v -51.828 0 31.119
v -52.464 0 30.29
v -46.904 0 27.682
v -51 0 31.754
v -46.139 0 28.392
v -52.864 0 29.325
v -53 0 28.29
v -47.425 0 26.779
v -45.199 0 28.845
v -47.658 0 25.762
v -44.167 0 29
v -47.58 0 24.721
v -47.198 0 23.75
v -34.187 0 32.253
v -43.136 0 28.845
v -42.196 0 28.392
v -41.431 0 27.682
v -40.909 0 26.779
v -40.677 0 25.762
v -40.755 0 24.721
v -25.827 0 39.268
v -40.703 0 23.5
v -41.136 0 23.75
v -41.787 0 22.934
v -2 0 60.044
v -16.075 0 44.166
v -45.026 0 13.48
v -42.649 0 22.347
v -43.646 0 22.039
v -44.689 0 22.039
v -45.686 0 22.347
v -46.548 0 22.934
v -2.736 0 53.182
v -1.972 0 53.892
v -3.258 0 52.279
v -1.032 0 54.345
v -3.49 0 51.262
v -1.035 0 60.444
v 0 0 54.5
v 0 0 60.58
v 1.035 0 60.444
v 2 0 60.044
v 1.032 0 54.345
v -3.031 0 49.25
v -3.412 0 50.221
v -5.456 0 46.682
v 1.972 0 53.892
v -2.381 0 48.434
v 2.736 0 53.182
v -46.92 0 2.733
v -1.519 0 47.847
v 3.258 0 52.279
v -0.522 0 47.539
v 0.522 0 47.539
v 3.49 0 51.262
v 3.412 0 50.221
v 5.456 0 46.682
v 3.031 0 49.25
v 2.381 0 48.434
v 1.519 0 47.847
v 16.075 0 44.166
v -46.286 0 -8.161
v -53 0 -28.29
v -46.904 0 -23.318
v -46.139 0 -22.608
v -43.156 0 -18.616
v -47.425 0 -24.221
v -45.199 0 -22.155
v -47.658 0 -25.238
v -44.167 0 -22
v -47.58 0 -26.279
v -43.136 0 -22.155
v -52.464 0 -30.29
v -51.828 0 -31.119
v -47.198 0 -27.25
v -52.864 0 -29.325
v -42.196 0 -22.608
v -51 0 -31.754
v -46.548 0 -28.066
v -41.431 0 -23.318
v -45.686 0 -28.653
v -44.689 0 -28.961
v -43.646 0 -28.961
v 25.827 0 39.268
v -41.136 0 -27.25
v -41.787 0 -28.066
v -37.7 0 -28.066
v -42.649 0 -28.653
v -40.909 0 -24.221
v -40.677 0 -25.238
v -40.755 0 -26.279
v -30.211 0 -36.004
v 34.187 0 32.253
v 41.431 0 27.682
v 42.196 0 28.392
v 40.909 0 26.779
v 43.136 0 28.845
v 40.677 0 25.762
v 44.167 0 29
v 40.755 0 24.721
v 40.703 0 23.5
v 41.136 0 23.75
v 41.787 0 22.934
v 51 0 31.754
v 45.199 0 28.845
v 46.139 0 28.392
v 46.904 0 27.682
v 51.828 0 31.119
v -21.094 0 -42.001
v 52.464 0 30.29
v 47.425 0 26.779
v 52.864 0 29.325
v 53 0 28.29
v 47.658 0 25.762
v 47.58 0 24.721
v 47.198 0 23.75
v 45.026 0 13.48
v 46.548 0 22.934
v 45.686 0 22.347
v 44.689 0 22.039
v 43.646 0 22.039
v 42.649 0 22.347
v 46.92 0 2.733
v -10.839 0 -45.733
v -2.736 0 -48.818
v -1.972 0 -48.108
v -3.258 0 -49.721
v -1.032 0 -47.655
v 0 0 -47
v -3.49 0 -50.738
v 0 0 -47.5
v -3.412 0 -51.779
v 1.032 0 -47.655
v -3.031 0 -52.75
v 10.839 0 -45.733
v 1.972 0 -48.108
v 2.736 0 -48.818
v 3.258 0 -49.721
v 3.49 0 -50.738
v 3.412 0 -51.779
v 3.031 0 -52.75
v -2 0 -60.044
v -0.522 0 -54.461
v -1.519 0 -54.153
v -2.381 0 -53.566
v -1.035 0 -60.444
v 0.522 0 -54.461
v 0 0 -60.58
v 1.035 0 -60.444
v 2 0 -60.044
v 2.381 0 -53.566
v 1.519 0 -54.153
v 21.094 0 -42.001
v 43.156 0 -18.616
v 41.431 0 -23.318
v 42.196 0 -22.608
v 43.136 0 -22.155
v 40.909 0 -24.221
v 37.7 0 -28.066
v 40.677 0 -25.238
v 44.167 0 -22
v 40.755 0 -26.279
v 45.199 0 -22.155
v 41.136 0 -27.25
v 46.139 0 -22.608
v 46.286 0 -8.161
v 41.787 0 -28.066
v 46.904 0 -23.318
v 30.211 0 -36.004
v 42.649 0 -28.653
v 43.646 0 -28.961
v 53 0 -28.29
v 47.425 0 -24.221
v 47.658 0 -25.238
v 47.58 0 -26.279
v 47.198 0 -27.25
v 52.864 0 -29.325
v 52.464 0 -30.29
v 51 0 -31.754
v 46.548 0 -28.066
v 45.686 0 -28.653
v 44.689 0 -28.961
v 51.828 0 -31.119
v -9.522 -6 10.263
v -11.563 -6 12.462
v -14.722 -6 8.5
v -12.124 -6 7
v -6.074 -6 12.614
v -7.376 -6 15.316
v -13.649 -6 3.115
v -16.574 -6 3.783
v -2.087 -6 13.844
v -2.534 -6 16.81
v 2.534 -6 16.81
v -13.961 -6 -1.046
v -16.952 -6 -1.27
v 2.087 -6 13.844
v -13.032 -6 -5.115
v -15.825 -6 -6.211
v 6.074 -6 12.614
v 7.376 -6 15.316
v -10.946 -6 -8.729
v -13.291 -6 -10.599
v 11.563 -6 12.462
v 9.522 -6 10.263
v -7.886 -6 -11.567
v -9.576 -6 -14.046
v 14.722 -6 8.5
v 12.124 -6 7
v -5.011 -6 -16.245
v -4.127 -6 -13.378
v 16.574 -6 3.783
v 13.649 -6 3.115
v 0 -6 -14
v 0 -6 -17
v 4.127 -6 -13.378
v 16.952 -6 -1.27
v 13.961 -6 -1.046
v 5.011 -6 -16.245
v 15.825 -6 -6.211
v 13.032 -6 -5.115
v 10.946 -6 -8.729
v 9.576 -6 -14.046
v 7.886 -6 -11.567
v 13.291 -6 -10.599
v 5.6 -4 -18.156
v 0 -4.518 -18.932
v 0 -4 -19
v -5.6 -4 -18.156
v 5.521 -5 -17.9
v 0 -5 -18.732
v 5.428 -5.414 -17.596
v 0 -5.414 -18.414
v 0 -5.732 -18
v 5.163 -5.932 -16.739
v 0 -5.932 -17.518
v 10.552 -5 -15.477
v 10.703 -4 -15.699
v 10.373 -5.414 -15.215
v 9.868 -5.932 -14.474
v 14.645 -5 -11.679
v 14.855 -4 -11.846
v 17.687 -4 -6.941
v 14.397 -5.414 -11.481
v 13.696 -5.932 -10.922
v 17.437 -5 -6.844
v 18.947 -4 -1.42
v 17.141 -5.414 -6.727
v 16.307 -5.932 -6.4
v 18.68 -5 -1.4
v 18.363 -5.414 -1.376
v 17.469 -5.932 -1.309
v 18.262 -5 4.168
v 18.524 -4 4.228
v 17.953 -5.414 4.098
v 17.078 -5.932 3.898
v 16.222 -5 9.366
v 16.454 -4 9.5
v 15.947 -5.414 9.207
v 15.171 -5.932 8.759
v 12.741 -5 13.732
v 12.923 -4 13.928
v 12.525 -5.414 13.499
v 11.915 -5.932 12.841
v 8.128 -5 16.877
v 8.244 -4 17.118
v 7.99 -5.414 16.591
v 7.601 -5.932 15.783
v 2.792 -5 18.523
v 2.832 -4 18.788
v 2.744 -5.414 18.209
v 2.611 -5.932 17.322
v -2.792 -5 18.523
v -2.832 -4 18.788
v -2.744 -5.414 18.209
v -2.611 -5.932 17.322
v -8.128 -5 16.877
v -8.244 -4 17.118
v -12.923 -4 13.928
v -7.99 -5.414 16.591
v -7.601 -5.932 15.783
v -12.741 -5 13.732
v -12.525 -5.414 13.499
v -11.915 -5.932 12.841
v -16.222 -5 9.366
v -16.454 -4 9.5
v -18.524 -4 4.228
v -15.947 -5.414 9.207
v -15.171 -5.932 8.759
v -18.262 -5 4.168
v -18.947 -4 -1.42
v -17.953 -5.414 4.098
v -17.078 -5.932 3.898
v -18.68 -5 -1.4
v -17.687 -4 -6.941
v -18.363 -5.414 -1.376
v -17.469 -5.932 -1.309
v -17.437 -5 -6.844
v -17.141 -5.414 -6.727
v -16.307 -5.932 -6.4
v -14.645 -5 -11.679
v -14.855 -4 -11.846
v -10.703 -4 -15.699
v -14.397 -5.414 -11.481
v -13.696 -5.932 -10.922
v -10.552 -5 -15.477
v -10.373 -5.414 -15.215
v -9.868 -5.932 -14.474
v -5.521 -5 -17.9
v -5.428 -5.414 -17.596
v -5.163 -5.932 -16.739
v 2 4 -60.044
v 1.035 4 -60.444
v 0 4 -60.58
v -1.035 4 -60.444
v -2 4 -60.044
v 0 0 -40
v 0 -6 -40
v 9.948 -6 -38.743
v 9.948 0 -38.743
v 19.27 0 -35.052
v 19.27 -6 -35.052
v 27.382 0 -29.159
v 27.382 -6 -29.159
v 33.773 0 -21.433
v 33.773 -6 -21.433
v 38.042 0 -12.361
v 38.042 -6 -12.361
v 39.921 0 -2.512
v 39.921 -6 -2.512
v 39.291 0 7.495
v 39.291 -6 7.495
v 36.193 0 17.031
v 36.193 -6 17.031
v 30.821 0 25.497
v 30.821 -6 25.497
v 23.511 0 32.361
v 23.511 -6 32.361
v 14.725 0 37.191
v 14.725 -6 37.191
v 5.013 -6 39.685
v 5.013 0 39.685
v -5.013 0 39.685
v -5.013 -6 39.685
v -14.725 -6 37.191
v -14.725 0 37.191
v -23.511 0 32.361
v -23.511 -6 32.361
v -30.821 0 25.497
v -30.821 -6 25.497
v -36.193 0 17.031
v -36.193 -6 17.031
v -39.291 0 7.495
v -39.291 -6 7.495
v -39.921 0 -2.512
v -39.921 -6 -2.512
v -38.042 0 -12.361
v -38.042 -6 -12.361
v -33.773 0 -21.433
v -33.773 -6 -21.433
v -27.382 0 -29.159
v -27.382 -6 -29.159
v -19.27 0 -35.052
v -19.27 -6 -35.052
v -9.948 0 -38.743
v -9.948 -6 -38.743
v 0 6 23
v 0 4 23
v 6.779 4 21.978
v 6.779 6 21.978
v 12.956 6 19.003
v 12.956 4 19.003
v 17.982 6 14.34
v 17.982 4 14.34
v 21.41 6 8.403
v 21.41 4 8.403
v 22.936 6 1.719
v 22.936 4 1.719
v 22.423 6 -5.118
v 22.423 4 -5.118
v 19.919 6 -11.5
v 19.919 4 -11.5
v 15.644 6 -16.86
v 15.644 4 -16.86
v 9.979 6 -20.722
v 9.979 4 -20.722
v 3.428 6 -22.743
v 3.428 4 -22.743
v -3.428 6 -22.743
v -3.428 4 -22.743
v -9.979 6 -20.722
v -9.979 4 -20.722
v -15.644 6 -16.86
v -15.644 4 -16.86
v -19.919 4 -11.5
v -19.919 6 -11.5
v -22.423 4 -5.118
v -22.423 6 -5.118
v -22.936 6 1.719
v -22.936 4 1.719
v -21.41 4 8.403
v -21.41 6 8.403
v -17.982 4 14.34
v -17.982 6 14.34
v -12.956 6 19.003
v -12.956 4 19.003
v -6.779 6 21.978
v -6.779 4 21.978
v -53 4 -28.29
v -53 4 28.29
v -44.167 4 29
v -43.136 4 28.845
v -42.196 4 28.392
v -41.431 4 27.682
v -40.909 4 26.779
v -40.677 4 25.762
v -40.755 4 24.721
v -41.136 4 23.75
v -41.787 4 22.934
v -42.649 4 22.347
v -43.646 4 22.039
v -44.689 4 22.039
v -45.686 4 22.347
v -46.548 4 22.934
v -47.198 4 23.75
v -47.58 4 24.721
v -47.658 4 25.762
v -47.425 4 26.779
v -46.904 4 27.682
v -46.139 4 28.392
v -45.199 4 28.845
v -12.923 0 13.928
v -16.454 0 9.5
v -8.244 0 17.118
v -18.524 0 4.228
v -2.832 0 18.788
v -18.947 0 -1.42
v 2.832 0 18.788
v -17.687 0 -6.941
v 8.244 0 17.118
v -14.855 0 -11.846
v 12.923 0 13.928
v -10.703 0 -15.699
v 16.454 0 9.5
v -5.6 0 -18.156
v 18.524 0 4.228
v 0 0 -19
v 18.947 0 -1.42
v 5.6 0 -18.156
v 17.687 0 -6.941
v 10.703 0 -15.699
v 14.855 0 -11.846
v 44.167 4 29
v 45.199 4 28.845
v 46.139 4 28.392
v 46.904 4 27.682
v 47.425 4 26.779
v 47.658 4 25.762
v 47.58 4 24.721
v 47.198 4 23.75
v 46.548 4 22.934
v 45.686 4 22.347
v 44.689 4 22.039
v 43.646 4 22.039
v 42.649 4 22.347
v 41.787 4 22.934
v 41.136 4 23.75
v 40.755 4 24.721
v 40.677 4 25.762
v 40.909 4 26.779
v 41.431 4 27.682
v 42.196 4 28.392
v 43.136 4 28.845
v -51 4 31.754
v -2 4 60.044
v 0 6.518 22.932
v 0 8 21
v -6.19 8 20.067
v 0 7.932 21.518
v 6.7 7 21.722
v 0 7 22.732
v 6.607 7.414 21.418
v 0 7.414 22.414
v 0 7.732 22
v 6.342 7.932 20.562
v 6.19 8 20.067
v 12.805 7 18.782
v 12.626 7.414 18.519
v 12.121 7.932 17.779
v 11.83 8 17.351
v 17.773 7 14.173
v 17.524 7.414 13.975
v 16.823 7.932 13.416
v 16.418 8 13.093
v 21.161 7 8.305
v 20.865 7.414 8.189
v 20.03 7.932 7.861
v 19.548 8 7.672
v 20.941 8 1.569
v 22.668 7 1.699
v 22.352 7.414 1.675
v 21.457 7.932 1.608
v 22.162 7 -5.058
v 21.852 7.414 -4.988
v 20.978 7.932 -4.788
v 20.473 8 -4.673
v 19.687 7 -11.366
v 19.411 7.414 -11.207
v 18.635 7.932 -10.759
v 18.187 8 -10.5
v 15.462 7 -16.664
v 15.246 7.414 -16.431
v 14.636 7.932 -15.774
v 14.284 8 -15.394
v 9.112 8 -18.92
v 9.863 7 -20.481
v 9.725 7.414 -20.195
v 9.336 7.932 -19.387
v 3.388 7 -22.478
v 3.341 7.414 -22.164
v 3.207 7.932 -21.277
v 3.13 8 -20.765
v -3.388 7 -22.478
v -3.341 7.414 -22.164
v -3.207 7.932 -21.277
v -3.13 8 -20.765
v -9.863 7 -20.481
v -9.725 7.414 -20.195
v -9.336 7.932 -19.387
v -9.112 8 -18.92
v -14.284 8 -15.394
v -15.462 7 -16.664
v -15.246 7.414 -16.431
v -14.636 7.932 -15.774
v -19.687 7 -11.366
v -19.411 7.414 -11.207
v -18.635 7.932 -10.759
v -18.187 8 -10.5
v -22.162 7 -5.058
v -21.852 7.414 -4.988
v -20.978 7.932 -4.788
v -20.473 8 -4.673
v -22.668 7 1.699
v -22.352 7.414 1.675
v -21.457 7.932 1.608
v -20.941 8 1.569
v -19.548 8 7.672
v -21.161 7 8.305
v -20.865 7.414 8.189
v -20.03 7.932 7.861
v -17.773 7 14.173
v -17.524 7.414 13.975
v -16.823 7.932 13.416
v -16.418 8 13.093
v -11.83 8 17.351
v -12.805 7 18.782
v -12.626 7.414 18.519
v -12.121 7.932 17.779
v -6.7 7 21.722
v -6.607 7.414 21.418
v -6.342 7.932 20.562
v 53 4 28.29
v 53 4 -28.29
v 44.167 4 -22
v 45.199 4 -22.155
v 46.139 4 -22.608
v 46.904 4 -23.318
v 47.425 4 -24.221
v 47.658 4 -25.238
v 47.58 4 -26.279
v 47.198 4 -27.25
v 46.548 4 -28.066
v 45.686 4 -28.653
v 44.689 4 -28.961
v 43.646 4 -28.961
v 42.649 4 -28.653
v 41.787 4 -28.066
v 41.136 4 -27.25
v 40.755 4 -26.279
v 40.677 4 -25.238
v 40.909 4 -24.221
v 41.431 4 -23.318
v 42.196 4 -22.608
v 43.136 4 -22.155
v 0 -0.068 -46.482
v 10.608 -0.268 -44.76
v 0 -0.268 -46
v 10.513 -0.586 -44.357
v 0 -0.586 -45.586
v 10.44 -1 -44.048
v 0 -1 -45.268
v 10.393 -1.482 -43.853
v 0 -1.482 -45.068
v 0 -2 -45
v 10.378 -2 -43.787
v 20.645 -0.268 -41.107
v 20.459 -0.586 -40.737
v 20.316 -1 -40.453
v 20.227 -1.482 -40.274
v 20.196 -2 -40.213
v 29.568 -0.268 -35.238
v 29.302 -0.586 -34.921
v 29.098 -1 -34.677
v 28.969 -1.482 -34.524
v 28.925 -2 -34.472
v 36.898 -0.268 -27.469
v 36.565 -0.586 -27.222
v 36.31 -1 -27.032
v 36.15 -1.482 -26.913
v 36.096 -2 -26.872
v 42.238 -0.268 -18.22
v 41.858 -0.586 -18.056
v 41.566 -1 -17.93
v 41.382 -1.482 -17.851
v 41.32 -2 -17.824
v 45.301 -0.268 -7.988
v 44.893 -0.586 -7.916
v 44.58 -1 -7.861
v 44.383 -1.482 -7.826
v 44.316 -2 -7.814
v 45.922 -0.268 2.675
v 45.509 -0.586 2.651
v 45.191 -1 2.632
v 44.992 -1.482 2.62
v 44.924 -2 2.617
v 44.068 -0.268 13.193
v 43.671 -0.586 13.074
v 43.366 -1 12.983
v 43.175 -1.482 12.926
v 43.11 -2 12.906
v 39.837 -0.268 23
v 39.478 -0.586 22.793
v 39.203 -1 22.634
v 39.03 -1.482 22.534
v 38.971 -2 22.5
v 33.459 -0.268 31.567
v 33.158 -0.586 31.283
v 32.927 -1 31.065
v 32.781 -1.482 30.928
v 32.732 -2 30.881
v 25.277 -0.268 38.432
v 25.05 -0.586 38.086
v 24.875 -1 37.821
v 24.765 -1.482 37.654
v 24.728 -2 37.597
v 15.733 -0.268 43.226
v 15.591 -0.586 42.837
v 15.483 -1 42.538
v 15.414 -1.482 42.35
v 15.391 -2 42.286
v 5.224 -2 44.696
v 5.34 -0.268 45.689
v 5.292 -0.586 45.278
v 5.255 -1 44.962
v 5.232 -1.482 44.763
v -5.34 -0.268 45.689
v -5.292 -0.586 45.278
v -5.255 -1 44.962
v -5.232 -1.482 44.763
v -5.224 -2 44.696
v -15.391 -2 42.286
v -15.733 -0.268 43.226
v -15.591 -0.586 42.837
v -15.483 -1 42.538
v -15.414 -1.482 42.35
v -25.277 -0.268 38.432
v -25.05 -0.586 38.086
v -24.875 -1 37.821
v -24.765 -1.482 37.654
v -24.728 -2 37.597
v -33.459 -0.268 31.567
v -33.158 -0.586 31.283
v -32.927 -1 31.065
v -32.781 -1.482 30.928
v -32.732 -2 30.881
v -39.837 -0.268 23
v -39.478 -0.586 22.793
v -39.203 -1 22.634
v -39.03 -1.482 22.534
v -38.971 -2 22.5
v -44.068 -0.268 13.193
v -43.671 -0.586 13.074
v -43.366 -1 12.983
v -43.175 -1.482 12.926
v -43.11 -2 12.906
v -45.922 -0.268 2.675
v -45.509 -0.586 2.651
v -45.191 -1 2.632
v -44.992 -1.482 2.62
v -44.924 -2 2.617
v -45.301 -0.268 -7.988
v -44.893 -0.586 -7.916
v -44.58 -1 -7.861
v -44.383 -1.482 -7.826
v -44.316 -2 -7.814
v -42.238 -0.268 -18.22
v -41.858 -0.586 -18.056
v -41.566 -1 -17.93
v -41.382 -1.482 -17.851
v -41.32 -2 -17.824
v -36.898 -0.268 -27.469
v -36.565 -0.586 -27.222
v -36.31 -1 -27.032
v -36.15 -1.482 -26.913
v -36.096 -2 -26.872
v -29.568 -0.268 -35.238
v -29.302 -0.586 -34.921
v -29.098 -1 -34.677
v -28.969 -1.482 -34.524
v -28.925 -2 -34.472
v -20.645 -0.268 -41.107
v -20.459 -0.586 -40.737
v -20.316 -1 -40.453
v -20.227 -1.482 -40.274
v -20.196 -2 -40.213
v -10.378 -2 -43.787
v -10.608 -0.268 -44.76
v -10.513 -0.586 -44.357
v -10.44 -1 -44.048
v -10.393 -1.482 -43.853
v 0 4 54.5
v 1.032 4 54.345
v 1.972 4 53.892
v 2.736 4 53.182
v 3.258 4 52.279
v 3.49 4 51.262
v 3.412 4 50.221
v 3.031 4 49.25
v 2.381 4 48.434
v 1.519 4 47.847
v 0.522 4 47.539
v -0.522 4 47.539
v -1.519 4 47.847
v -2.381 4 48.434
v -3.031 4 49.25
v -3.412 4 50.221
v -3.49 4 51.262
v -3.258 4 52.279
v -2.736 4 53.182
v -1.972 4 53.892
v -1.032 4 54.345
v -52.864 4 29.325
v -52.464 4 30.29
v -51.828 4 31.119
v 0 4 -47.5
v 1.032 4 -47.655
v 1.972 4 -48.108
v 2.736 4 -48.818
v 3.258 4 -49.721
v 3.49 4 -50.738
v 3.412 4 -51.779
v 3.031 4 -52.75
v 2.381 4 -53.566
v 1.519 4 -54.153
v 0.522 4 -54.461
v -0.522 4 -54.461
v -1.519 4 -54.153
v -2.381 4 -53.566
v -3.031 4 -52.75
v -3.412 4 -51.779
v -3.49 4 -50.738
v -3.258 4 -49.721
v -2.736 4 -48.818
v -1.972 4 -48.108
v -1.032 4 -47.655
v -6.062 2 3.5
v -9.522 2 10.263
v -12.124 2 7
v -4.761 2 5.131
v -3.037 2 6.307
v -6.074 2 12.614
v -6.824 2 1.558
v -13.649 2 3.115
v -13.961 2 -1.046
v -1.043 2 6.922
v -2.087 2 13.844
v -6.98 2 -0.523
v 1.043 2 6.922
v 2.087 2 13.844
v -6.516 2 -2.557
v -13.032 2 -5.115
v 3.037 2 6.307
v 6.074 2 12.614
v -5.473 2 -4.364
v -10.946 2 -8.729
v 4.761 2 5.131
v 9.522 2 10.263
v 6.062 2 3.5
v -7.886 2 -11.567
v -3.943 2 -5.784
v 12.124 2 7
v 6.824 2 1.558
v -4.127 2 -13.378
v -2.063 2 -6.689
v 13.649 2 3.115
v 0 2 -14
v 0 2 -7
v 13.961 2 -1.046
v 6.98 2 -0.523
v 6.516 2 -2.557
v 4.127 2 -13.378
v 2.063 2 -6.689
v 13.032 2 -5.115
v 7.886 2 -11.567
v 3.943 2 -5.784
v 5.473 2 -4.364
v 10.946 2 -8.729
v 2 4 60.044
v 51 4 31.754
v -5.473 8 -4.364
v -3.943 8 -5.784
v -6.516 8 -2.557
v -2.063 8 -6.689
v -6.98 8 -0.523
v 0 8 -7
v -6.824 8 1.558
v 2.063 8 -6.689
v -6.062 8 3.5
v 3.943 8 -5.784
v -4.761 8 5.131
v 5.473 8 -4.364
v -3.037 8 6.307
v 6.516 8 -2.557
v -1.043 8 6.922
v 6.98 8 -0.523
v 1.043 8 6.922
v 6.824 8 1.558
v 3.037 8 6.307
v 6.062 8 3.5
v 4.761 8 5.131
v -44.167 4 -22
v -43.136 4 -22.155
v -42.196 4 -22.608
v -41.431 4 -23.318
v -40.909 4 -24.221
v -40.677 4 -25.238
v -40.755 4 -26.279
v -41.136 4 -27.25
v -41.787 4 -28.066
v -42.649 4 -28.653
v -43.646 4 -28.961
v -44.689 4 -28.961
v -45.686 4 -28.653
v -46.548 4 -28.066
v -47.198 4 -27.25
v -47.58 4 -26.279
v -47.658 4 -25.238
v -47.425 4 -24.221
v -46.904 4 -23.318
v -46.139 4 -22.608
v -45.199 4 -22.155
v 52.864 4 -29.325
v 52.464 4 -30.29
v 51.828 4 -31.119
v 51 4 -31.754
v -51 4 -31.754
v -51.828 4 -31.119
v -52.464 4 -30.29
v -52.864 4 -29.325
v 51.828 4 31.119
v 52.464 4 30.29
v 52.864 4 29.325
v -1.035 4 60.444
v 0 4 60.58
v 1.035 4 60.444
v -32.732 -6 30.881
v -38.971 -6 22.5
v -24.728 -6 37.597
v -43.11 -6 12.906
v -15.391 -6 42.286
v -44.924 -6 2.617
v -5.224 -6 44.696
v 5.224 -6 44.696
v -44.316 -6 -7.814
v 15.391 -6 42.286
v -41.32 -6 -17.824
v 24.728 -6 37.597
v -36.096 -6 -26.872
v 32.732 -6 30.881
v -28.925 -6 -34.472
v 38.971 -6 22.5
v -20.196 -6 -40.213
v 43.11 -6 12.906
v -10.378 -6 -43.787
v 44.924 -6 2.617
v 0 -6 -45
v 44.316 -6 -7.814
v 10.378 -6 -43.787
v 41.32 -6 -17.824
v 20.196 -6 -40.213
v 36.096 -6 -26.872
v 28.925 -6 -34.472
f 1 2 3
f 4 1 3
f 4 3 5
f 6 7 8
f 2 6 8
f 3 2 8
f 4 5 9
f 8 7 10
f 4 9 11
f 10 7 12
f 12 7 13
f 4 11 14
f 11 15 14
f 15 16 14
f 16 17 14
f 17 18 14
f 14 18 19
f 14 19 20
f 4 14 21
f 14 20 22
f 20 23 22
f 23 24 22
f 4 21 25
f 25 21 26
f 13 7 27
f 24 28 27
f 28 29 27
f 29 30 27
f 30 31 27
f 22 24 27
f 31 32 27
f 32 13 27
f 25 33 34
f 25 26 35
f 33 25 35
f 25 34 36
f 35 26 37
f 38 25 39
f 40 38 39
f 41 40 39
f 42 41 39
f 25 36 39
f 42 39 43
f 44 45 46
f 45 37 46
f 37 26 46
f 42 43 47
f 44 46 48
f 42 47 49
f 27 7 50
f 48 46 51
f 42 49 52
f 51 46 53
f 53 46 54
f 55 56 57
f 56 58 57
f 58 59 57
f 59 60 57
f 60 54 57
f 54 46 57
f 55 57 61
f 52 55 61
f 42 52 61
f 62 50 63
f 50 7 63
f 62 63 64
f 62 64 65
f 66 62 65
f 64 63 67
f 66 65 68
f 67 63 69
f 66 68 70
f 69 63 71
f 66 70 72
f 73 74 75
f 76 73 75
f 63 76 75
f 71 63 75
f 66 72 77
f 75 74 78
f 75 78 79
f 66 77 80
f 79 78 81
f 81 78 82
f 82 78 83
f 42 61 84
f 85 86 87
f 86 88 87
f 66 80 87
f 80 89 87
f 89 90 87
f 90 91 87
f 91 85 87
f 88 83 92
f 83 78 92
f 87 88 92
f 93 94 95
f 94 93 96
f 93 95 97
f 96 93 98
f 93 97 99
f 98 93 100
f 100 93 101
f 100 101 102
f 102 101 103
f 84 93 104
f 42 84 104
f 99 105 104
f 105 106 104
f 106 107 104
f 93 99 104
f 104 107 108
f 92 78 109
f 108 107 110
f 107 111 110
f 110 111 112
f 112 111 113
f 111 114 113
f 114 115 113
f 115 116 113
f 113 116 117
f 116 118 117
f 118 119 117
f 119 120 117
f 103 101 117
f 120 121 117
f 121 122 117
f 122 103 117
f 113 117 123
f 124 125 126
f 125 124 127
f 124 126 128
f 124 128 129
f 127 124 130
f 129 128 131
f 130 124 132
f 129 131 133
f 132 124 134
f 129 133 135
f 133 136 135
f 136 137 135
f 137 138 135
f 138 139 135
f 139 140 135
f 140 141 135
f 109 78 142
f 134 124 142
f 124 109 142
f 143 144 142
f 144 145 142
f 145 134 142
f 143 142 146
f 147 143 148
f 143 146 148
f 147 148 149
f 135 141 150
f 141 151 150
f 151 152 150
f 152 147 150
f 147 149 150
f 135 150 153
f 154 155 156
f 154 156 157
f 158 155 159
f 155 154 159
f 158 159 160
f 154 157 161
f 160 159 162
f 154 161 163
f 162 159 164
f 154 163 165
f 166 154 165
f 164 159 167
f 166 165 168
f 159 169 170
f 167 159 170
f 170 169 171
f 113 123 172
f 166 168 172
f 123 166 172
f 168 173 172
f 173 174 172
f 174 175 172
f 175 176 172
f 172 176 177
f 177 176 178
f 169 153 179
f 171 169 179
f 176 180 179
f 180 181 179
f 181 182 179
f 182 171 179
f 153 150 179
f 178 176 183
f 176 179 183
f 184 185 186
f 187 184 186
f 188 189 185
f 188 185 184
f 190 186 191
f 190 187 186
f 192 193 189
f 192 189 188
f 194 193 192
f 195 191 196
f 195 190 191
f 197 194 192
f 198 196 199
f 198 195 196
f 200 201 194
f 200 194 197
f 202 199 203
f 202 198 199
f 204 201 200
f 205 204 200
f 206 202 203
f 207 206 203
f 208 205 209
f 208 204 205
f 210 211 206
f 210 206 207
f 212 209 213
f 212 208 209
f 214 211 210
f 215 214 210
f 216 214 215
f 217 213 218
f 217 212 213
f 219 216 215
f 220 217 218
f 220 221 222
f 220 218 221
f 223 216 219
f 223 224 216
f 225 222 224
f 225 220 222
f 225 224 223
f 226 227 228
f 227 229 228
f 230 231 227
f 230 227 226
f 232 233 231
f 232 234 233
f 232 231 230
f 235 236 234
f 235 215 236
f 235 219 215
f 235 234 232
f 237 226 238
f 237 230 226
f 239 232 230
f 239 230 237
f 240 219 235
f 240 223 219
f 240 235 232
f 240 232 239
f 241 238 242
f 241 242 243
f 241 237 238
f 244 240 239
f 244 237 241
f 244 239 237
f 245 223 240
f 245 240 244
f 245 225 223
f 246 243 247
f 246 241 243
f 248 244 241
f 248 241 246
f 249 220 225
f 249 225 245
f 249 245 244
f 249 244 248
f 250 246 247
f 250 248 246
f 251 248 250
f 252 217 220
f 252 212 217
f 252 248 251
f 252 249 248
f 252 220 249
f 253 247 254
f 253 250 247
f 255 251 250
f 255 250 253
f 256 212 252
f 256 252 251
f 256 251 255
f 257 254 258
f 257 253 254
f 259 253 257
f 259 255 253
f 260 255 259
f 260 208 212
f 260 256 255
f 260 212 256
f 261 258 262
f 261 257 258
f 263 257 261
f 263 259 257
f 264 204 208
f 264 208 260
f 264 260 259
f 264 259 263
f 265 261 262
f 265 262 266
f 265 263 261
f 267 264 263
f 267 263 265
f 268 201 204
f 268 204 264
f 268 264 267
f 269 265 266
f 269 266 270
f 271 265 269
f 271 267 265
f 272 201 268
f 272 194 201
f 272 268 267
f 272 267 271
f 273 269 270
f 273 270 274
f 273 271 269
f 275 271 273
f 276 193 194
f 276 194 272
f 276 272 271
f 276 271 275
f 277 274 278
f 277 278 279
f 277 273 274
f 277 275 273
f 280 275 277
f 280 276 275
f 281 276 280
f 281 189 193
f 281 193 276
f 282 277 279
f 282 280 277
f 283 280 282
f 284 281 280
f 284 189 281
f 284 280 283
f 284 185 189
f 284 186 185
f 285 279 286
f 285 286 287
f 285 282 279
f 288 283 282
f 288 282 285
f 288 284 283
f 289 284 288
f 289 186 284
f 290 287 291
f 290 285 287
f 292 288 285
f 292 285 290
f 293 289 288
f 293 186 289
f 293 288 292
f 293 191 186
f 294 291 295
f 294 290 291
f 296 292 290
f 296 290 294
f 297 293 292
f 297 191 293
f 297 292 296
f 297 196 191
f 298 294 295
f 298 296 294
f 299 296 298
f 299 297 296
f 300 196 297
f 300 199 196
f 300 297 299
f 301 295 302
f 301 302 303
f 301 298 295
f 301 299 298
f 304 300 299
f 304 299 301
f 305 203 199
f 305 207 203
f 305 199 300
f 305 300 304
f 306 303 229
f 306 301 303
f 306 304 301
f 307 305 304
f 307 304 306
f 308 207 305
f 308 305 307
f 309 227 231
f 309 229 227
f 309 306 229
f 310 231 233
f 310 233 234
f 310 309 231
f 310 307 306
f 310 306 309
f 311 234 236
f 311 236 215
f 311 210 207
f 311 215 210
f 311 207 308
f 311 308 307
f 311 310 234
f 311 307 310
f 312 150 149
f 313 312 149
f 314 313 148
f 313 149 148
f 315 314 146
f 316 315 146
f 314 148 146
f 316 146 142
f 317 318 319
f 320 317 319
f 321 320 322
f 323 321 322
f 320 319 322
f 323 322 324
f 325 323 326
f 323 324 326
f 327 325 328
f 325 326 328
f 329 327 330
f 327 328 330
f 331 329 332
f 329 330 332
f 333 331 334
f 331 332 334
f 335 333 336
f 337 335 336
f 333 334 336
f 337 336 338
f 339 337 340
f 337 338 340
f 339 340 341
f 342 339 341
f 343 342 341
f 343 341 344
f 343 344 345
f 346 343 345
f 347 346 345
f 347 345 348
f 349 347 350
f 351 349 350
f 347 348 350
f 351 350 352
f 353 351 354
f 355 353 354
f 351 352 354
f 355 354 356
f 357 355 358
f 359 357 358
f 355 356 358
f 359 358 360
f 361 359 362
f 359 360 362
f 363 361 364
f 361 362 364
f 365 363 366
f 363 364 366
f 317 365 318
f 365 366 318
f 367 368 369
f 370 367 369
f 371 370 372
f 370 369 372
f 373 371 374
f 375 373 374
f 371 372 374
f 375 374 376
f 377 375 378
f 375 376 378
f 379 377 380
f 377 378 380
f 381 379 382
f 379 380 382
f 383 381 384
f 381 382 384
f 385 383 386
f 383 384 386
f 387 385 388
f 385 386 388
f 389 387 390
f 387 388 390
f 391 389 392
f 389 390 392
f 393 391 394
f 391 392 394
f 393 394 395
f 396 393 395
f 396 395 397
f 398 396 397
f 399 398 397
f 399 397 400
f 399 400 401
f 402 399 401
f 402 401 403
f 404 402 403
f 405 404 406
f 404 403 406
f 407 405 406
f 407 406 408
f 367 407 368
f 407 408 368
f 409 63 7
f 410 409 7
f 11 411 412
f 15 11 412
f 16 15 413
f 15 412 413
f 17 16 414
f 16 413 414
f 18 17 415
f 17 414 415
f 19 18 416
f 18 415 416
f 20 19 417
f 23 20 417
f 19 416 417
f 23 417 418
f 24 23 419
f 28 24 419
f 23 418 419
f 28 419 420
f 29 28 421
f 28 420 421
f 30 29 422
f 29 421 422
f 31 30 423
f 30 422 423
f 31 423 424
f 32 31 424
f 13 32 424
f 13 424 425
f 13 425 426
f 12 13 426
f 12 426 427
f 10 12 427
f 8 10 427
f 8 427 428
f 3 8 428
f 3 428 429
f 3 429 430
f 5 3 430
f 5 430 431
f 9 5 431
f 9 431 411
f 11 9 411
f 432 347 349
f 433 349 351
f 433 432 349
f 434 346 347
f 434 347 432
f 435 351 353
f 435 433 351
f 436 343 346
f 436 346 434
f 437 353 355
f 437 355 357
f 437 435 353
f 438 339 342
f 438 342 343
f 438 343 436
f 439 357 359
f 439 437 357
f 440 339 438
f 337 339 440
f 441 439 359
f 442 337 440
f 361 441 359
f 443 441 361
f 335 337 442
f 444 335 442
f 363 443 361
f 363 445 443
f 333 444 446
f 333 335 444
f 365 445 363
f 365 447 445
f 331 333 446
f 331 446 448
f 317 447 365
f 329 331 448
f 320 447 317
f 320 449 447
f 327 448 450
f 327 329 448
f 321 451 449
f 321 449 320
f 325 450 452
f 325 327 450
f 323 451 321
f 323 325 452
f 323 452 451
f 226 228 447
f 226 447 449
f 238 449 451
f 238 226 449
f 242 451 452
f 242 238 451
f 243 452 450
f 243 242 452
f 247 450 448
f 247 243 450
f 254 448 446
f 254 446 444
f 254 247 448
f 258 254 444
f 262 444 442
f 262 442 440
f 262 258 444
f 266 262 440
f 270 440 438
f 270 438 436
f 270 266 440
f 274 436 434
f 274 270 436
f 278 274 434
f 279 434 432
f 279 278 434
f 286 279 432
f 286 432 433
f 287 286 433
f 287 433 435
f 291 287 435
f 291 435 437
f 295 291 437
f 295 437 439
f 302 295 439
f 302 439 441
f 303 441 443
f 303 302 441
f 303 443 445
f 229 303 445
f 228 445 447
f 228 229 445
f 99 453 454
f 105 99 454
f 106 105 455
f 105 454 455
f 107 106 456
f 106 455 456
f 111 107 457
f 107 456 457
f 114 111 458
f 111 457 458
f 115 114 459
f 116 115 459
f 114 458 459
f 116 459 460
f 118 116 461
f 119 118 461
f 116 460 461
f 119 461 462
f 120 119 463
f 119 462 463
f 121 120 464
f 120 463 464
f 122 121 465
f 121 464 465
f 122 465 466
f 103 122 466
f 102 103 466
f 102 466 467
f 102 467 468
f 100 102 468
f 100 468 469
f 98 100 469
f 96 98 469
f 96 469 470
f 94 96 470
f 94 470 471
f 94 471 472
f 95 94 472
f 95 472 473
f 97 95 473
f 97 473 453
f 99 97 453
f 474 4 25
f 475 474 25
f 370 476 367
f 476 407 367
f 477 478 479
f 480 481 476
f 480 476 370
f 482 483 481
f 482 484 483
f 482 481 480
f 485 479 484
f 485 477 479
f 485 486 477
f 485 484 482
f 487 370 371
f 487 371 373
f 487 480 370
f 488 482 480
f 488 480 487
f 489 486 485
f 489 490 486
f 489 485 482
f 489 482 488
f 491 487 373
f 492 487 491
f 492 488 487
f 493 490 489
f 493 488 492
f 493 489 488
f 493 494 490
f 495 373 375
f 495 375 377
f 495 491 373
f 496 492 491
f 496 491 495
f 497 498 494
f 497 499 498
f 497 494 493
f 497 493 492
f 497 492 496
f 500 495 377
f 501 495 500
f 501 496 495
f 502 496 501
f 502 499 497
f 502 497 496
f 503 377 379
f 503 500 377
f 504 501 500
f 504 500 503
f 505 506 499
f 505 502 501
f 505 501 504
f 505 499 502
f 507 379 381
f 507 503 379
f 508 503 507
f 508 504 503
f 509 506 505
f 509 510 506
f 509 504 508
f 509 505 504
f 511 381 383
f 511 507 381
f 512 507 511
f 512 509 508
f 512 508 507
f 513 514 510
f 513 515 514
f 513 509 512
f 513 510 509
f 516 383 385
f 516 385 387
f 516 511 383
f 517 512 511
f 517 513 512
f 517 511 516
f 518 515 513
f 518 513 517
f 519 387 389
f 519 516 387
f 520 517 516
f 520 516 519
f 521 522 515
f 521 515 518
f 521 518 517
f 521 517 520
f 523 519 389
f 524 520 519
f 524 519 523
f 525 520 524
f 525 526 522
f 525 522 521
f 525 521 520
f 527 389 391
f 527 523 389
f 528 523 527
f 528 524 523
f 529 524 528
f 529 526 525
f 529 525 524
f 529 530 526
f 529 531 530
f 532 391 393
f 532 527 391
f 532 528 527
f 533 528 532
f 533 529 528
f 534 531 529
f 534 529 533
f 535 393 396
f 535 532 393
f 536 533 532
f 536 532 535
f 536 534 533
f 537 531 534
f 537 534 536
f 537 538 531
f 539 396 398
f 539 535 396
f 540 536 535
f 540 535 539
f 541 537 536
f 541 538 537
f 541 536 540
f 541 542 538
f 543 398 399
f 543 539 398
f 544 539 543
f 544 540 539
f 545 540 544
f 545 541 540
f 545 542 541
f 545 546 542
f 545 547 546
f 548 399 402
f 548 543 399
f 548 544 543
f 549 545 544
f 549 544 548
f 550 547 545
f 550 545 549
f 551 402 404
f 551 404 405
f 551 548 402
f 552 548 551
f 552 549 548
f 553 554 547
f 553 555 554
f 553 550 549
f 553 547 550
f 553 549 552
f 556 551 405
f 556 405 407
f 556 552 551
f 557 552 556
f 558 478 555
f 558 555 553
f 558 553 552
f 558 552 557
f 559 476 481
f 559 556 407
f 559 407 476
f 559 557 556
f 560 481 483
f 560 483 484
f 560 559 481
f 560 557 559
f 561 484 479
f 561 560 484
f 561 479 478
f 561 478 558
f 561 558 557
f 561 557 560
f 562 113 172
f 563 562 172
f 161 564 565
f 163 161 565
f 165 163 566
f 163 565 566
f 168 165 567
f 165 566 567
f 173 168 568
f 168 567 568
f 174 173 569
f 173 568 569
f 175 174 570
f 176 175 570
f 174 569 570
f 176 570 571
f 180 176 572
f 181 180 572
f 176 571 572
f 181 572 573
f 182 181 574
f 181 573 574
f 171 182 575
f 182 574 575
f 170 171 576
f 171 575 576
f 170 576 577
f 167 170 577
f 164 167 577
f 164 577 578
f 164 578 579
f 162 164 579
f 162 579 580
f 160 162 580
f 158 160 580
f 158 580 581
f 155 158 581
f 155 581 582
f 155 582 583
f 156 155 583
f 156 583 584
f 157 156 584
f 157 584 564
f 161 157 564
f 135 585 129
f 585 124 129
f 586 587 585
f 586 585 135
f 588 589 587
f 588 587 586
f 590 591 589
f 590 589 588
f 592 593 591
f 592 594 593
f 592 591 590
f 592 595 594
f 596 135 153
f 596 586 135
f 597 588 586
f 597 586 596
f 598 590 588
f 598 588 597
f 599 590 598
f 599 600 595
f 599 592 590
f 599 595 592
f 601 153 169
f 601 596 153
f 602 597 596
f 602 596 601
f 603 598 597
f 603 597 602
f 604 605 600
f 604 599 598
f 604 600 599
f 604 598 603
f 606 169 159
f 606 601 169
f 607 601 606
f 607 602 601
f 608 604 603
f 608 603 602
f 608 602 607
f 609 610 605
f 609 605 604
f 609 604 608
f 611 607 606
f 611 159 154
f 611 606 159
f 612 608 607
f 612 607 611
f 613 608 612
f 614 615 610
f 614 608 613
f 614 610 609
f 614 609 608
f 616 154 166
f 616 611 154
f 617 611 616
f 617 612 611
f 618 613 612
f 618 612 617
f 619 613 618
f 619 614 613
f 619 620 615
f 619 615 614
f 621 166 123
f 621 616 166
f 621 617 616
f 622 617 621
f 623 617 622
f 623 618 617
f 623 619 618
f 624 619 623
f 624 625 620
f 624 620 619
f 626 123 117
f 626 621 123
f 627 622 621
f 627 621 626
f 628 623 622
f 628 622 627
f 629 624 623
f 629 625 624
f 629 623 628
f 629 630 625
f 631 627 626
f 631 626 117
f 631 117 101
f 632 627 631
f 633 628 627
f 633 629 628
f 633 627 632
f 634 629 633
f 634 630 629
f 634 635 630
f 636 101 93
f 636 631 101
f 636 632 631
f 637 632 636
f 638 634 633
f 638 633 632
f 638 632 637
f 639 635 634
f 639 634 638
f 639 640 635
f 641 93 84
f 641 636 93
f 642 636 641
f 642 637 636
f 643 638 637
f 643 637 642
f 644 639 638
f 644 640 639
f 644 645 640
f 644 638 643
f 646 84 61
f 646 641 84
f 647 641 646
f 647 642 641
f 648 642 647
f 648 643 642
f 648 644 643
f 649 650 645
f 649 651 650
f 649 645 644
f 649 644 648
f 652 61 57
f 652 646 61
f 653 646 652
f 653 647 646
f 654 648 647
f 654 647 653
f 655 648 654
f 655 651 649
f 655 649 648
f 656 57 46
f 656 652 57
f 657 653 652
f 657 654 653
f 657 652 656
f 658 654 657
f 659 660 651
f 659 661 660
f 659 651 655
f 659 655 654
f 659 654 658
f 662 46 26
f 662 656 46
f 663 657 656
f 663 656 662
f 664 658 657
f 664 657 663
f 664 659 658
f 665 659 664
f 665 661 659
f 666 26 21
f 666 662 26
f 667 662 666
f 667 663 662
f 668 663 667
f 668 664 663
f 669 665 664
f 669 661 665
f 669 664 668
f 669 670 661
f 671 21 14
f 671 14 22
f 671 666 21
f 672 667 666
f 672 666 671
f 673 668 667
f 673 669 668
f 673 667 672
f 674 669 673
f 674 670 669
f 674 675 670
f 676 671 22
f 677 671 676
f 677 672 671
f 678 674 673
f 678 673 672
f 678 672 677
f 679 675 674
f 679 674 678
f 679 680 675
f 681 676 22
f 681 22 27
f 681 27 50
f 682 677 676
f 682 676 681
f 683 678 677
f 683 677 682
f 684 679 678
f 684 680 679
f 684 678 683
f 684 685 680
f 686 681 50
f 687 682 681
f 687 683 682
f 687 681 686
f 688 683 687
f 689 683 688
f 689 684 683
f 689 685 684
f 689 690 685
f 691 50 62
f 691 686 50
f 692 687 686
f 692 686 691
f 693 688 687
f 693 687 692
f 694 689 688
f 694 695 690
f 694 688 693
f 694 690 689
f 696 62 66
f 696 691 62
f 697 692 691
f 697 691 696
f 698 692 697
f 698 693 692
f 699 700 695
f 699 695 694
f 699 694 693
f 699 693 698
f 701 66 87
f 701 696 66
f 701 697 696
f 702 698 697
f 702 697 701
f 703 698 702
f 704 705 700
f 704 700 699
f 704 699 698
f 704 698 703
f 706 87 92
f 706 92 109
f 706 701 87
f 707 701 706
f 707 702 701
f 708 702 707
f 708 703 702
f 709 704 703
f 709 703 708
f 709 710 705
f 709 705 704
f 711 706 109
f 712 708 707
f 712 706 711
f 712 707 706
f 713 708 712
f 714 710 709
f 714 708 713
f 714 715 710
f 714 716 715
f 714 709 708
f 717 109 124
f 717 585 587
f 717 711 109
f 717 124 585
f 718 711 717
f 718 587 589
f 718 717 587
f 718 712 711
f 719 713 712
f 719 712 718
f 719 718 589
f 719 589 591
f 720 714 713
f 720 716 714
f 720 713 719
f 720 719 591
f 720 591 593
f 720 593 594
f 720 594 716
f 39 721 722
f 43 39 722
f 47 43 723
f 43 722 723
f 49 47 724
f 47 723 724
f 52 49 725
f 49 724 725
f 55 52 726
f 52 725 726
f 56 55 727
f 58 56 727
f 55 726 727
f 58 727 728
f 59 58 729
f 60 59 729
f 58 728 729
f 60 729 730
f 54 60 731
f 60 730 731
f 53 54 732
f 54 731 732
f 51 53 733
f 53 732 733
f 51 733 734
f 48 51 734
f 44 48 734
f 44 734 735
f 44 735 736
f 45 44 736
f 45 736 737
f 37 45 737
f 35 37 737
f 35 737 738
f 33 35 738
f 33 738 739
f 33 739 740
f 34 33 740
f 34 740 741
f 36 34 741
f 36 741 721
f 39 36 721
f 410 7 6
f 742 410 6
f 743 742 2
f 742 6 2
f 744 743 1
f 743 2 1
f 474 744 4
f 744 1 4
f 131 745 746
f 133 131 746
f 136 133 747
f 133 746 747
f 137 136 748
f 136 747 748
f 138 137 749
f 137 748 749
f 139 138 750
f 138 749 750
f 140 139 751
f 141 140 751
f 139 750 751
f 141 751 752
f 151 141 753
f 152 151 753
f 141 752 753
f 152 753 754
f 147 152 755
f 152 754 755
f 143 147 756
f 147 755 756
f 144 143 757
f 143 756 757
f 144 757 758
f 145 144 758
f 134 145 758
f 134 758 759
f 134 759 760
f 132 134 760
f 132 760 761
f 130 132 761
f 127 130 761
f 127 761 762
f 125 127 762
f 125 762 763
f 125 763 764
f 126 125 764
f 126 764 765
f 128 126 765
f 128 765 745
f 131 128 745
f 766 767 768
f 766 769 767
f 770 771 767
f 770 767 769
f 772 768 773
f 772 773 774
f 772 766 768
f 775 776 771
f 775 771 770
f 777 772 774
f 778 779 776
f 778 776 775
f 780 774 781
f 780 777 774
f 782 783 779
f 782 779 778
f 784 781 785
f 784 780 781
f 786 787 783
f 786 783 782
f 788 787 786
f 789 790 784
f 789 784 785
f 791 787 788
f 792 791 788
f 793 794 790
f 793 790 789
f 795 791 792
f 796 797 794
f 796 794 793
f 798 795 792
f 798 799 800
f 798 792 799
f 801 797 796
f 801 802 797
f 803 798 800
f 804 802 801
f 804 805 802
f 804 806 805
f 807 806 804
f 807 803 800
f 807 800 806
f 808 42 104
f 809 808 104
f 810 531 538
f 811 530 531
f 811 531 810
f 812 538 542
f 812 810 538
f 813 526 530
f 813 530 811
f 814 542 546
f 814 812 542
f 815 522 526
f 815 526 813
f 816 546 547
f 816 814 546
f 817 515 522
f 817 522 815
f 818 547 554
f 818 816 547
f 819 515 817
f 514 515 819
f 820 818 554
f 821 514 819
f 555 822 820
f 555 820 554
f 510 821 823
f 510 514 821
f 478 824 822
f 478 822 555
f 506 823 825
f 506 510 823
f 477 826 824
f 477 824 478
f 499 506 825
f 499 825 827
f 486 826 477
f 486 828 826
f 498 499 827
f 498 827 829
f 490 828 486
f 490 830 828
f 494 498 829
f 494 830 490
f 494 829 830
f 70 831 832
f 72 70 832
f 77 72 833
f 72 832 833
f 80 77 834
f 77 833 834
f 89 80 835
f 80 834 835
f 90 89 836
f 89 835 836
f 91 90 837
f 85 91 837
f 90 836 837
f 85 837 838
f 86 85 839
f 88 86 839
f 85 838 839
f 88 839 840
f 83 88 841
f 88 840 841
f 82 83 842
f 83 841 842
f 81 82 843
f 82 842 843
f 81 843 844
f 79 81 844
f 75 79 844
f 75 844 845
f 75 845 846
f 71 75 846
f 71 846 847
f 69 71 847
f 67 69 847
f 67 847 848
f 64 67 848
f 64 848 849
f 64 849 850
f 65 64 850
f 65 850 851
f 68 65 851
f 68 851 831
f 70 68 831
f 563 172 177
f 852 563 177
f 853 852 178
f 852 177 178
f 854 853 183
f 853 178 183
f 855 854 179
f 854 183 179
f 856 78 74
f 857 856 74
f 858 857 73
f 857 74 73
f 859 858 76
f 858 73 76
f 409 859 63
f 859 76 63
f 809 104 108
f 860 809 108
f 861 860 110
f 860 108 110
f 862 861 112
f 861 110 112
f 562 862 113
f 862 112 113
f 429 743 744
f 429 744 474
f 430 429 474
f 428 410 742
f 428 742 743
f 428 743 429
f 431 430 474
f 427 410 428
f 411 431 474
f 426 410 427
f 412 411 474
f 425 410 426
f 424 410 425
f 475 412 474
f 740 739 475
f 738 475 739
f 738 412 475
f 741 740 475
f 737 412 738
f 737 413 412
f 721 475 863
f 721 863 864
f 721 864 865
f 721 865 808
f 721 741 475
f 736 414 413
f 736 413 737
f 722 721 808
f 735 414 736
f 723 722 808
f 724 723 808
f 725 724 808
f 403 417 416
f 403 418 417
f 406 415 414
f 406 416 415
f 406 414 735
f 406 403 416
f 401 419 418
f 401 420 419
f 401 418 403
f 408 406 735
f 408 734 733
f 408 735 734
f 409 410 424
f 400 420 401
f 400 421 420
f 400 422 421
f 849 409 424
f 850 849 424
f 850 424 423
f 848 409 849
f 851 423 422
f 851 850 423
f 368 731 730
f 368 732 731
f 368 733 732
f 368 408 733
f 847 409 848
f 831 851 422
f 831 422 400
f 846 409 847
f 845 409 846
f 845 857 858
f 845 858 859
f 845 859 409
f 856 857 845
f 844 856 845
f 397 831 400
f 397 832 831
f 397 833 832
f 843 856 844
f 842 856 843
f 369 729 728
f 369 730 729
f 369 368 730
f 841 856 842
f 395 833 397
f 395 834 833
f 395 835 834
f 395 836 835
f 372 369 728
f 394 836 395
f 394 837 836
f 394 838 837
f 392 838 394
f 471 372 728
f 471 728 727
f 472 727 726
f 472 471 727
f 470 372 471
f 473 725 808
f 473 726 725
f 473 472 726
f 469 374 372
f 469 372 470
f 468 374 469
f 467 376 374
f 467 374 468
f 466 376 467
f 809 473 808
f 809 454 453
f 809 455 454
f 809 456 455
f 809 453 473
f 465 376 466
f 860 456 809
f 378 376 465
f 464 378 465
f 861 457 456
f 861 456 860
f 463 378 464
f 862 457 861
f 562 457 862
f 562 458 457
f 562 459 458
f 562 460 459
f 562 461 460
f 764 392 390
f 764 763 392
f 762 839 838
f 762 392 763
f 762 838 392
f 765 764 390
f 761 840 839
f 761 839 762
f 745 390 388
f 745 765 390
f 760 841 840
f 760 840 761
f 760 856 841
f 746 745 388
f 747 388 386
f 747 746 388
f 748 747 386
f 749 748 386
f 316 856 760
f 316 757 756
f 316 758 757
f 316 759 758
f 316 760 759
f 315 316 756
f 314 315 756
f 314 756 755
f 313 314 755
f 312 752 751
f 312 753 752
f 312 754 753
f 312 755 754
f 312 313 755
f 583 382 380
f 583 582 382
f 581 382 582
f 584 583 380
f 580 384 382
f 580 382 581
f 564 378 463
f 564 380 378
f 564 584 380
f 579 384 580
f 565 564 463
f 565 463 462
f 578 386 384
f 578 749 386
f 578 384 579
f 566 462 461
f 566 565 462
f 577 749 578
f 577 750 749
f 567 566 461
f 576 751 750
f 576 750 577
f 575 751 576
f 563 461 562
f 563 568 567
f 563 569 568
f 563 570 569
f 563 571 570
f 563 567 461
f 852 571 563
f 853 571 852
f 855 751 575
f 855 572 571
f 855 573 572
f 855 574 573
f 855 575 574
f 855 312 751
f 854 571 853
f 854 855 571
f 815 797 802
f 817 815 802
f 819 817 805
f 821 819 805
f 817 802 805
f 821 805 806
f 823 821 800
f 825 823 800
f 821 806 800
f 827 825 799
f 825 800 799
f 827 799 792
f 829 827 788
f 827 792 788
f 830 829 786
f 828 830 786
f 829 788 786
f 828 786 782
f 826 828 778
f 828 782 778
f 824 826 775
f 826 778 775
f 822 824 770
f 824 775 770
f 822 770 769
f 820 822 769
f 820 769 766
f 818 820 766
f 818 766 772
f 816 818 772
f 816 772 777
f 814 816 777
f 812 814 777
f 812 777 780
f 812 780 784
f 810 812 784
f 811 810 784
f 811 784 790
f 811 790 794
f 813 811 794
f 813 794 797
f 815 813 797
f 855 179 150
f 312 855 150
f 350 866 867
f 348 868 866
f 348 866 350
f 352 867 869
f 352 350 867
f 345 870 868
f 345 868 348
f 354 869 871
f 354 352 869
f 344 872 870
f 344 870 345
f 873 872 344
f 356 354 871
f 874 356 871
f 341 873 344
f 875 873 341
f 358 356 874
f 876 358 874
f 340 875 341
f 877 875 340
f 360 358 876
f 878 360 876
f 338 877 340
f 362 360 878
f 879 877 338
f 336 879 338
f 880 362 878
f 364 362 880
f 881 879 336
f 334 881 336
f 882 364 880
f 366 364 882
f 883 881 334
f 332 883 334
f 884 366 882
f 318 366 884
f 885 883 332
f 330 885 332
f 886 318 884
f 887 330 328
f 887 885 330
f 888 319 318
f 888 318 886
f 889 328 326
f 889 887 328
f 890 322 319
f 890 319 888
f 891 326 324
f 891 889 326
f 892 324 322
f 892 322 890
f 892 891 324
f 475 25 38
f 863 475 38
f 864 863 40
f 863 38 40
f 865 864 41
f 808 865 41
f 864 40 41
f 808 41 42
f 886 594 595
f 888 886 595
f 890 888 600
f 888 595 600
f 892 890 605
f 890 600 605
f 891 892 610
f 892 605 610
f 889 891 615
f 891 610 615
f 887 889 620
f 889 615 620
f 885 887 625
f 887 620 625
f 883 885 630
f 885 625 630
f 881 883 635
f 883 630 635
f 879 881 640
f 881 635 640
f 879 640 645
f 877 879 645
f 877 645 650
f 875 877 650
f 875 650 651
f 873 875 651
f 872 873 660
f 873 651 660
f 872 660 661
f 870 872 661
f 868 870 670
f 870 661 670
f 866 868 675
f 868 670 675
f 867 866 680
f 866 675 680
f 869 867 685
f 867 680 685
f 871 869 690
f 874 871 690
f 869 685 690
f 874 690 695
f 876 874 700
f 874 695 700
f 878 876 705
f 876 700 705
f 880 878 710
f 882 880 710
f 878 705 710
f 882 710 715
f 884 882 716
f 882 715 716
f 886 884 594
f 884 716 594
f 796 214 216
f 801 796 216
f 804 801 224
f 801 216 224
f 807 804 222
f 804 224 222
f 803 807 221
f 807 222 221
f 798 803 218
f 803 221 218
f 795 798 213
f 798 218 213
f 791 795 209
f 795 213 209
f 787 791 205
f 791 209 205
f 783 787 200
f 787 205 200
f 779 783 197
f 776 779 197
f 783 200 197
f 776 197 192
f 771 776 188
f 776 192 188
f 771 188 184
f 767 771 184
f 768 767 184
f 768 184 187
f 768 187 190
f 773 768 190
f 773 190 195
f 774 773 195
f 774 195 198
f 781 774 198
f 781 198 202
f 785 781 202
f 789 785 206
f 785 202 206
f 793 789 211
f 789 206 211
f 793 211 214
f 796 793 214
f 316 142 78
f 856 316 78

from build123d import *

# Parameters (mm, degrees)
BOSS_EXTRUDE1_DEPTH = 4
SKETCH2_R           = 23
BOSS_EXTRUDE2_DEPTH = 4
SKETCH3_R           = 45
BOSS_EXTRUDE3_DEPTH = 6
SKETCH4_R           = 40
SKETCH4_R_2         = 19
CUT_EXTRUDE1_DEPTH  = 6
SKETCH5_R           = 14
CUT_EXTRUDE2_DEPTH  = 8
SKETCH6_R           = 7
CUT_EXTRUDE3_DEPTH  = 81.888663881
FILLET1_R           = 2
SKETCH7_R           = 3.5
CUT_EXTRUDE4_DEPTH  = 82.110886719


with BuildPart() as part:
    # Sketch1 → Boss-Extrude1 (new body)
    with BuildSketch(Plane(origin=(0, 0, 0), x_dir=(1, 0, 0), z_dir=(0, 1, 0))):
        with BuildLine():
            Line((2, -60.044427996), (51, -31.754264805))
            ThreePointArc((51, -31.754264805), (52.464101615, -30.29016319), (53, -28.29016319))
            Line((53, -28.29016319), (53, 28.29016319))
            ThreePointArc((53, 28.29016319), (52.464101615, 30.29016319), (51, 31.754264805))
            Line((51, 31.754264805), (2, 60.044427996))
            ThreePointArc((2, 60.044427996), (0, 60.580326381), (-2, 60.044427996))
            Line((-2, 60.044427996), (-51, 31.754264805))
            ThreePointArc((-51, 31.754264805), (-52.464101615, 30.29016319), (-53, 28.29016319))
            Line((-53, 28.29016319), (-53, -28.29016319))
            ThreePointArc((-53, -28.29016319), (-52.464101615, -30.29016319), (-51, -31.754264805))
            Line((-51, -31.754264805), (-2, -60.044427996))
            ThreePointArc((-2, -60.044427996), (0, -60.580326381), (2, -60.044427996))
        make_face()
    extrude(amount=BOSS_EXTRUDE1_DEPTH)

    # Sketch2 → Boss-Extrude2 (add)
    with BuildSketch(Plane(origin=(0, 4, 0), x_dir=(1, 0, 0), z_dir=(0, 1, 0))):
        with Locations(Location((0, 0, 0), (0, 0, 270))):
            Circle(SKETCH2_R)
    extrude(amount=BOSS_EXTRUDE2_DEPTH)

    # Sketch3 → Boss-Extrude3 (add)
    with BuildSketch(Plane.XZ):
        with Locations(Location((0, 0, 0), (0, 0, 270))):
            Circle(SKETCH3_R)
    extrude(amount=BOSS_EXTRUDE3_DEPTH)

    # Sketch4 → Cut-Extrude1 (cut)
    with BuildSketch(Plane.XZ.offset(6)):
        with Locations(Location((0, 0, 0), (0, 0, 270))):
            Circle(SKETCH4_R)
        with Locations(Location((0, 0, 0), (0, 0, 270))):
            Circle(SKETCH4_R_2, mode=Mode.SUBTRACT)
    extrude(amount=-CUT_EXTRUDE1_DEPTH, mode=Mode.SUBTRACT)

    # Sketch5 → Cut-Extrude2 (cut)
    with BuildSketch(Plane.XZ.offset(6)):
        with Locations(Location((0, 0, 0), (0, 0, 270))):
            Circle(SKETCH5_R)
    extrude(amount=-CUT_EXTRUDE2_DEPTH, mode=Mode.SUBTRACT)

    # Sketch6 → Cut-Extrude3 (cut, through all)
    with BuildSketch(Plane.XZ.offset(-2)):
        with Locations(Location((0, 0, 0), (0, 0, 270))):
            Circle(SKETCH6_R)
    extrude(amount=-CUT_EXTRUDE3_DEPTH, mode=Mode.SUBTRACT)

    # Fillet1
    fillet1_edges = [part.edges().sort_by_distance(p)[0] for p in [
        (0, 8, -23),
        (0, 0, 45),
        (0, -6, 19),
    ]]
    fillet(fillet1_edges, radius=FILLET1_R)

    # Sketch7 → Cut-Extrude4 (cut, through all)
    with BuildSketch(Plane(origin=(0, 4, 0), x_dir=(1, 0, 0), z_dir=(0, 1, 0))):
        with Locations(Location((0, 51, 0), (0, 0, 270))):
            Circle(SKETCH7_R)
        with Locations(Location((44.167295593, 25.5, 0), (0, 0, 270))):
            Circle(SKETCH7_R)
        with Locations(Location((44.167295593, -25.5, 0), (0, 0, 270))):
            Circle(SKETCH7_R)
        with Locations(Location((0, -51, 0), (0, 0, 270))):
            Circle(SKETCH7_R)
        with Locations(Location((-44.167295593, -25.5, 0), (0, 0, 270))):
            Circle(SKETCH7_R)
        with Locations(Location((-44.167295593, 25.5, 0), (0, 0, 270))):
            Circle(SKETCH7_R)
    extrude(amount=-CUT_EXTRUDE4_DEPTH, mode=Mode.SUBTRACT)


solid = part.part
